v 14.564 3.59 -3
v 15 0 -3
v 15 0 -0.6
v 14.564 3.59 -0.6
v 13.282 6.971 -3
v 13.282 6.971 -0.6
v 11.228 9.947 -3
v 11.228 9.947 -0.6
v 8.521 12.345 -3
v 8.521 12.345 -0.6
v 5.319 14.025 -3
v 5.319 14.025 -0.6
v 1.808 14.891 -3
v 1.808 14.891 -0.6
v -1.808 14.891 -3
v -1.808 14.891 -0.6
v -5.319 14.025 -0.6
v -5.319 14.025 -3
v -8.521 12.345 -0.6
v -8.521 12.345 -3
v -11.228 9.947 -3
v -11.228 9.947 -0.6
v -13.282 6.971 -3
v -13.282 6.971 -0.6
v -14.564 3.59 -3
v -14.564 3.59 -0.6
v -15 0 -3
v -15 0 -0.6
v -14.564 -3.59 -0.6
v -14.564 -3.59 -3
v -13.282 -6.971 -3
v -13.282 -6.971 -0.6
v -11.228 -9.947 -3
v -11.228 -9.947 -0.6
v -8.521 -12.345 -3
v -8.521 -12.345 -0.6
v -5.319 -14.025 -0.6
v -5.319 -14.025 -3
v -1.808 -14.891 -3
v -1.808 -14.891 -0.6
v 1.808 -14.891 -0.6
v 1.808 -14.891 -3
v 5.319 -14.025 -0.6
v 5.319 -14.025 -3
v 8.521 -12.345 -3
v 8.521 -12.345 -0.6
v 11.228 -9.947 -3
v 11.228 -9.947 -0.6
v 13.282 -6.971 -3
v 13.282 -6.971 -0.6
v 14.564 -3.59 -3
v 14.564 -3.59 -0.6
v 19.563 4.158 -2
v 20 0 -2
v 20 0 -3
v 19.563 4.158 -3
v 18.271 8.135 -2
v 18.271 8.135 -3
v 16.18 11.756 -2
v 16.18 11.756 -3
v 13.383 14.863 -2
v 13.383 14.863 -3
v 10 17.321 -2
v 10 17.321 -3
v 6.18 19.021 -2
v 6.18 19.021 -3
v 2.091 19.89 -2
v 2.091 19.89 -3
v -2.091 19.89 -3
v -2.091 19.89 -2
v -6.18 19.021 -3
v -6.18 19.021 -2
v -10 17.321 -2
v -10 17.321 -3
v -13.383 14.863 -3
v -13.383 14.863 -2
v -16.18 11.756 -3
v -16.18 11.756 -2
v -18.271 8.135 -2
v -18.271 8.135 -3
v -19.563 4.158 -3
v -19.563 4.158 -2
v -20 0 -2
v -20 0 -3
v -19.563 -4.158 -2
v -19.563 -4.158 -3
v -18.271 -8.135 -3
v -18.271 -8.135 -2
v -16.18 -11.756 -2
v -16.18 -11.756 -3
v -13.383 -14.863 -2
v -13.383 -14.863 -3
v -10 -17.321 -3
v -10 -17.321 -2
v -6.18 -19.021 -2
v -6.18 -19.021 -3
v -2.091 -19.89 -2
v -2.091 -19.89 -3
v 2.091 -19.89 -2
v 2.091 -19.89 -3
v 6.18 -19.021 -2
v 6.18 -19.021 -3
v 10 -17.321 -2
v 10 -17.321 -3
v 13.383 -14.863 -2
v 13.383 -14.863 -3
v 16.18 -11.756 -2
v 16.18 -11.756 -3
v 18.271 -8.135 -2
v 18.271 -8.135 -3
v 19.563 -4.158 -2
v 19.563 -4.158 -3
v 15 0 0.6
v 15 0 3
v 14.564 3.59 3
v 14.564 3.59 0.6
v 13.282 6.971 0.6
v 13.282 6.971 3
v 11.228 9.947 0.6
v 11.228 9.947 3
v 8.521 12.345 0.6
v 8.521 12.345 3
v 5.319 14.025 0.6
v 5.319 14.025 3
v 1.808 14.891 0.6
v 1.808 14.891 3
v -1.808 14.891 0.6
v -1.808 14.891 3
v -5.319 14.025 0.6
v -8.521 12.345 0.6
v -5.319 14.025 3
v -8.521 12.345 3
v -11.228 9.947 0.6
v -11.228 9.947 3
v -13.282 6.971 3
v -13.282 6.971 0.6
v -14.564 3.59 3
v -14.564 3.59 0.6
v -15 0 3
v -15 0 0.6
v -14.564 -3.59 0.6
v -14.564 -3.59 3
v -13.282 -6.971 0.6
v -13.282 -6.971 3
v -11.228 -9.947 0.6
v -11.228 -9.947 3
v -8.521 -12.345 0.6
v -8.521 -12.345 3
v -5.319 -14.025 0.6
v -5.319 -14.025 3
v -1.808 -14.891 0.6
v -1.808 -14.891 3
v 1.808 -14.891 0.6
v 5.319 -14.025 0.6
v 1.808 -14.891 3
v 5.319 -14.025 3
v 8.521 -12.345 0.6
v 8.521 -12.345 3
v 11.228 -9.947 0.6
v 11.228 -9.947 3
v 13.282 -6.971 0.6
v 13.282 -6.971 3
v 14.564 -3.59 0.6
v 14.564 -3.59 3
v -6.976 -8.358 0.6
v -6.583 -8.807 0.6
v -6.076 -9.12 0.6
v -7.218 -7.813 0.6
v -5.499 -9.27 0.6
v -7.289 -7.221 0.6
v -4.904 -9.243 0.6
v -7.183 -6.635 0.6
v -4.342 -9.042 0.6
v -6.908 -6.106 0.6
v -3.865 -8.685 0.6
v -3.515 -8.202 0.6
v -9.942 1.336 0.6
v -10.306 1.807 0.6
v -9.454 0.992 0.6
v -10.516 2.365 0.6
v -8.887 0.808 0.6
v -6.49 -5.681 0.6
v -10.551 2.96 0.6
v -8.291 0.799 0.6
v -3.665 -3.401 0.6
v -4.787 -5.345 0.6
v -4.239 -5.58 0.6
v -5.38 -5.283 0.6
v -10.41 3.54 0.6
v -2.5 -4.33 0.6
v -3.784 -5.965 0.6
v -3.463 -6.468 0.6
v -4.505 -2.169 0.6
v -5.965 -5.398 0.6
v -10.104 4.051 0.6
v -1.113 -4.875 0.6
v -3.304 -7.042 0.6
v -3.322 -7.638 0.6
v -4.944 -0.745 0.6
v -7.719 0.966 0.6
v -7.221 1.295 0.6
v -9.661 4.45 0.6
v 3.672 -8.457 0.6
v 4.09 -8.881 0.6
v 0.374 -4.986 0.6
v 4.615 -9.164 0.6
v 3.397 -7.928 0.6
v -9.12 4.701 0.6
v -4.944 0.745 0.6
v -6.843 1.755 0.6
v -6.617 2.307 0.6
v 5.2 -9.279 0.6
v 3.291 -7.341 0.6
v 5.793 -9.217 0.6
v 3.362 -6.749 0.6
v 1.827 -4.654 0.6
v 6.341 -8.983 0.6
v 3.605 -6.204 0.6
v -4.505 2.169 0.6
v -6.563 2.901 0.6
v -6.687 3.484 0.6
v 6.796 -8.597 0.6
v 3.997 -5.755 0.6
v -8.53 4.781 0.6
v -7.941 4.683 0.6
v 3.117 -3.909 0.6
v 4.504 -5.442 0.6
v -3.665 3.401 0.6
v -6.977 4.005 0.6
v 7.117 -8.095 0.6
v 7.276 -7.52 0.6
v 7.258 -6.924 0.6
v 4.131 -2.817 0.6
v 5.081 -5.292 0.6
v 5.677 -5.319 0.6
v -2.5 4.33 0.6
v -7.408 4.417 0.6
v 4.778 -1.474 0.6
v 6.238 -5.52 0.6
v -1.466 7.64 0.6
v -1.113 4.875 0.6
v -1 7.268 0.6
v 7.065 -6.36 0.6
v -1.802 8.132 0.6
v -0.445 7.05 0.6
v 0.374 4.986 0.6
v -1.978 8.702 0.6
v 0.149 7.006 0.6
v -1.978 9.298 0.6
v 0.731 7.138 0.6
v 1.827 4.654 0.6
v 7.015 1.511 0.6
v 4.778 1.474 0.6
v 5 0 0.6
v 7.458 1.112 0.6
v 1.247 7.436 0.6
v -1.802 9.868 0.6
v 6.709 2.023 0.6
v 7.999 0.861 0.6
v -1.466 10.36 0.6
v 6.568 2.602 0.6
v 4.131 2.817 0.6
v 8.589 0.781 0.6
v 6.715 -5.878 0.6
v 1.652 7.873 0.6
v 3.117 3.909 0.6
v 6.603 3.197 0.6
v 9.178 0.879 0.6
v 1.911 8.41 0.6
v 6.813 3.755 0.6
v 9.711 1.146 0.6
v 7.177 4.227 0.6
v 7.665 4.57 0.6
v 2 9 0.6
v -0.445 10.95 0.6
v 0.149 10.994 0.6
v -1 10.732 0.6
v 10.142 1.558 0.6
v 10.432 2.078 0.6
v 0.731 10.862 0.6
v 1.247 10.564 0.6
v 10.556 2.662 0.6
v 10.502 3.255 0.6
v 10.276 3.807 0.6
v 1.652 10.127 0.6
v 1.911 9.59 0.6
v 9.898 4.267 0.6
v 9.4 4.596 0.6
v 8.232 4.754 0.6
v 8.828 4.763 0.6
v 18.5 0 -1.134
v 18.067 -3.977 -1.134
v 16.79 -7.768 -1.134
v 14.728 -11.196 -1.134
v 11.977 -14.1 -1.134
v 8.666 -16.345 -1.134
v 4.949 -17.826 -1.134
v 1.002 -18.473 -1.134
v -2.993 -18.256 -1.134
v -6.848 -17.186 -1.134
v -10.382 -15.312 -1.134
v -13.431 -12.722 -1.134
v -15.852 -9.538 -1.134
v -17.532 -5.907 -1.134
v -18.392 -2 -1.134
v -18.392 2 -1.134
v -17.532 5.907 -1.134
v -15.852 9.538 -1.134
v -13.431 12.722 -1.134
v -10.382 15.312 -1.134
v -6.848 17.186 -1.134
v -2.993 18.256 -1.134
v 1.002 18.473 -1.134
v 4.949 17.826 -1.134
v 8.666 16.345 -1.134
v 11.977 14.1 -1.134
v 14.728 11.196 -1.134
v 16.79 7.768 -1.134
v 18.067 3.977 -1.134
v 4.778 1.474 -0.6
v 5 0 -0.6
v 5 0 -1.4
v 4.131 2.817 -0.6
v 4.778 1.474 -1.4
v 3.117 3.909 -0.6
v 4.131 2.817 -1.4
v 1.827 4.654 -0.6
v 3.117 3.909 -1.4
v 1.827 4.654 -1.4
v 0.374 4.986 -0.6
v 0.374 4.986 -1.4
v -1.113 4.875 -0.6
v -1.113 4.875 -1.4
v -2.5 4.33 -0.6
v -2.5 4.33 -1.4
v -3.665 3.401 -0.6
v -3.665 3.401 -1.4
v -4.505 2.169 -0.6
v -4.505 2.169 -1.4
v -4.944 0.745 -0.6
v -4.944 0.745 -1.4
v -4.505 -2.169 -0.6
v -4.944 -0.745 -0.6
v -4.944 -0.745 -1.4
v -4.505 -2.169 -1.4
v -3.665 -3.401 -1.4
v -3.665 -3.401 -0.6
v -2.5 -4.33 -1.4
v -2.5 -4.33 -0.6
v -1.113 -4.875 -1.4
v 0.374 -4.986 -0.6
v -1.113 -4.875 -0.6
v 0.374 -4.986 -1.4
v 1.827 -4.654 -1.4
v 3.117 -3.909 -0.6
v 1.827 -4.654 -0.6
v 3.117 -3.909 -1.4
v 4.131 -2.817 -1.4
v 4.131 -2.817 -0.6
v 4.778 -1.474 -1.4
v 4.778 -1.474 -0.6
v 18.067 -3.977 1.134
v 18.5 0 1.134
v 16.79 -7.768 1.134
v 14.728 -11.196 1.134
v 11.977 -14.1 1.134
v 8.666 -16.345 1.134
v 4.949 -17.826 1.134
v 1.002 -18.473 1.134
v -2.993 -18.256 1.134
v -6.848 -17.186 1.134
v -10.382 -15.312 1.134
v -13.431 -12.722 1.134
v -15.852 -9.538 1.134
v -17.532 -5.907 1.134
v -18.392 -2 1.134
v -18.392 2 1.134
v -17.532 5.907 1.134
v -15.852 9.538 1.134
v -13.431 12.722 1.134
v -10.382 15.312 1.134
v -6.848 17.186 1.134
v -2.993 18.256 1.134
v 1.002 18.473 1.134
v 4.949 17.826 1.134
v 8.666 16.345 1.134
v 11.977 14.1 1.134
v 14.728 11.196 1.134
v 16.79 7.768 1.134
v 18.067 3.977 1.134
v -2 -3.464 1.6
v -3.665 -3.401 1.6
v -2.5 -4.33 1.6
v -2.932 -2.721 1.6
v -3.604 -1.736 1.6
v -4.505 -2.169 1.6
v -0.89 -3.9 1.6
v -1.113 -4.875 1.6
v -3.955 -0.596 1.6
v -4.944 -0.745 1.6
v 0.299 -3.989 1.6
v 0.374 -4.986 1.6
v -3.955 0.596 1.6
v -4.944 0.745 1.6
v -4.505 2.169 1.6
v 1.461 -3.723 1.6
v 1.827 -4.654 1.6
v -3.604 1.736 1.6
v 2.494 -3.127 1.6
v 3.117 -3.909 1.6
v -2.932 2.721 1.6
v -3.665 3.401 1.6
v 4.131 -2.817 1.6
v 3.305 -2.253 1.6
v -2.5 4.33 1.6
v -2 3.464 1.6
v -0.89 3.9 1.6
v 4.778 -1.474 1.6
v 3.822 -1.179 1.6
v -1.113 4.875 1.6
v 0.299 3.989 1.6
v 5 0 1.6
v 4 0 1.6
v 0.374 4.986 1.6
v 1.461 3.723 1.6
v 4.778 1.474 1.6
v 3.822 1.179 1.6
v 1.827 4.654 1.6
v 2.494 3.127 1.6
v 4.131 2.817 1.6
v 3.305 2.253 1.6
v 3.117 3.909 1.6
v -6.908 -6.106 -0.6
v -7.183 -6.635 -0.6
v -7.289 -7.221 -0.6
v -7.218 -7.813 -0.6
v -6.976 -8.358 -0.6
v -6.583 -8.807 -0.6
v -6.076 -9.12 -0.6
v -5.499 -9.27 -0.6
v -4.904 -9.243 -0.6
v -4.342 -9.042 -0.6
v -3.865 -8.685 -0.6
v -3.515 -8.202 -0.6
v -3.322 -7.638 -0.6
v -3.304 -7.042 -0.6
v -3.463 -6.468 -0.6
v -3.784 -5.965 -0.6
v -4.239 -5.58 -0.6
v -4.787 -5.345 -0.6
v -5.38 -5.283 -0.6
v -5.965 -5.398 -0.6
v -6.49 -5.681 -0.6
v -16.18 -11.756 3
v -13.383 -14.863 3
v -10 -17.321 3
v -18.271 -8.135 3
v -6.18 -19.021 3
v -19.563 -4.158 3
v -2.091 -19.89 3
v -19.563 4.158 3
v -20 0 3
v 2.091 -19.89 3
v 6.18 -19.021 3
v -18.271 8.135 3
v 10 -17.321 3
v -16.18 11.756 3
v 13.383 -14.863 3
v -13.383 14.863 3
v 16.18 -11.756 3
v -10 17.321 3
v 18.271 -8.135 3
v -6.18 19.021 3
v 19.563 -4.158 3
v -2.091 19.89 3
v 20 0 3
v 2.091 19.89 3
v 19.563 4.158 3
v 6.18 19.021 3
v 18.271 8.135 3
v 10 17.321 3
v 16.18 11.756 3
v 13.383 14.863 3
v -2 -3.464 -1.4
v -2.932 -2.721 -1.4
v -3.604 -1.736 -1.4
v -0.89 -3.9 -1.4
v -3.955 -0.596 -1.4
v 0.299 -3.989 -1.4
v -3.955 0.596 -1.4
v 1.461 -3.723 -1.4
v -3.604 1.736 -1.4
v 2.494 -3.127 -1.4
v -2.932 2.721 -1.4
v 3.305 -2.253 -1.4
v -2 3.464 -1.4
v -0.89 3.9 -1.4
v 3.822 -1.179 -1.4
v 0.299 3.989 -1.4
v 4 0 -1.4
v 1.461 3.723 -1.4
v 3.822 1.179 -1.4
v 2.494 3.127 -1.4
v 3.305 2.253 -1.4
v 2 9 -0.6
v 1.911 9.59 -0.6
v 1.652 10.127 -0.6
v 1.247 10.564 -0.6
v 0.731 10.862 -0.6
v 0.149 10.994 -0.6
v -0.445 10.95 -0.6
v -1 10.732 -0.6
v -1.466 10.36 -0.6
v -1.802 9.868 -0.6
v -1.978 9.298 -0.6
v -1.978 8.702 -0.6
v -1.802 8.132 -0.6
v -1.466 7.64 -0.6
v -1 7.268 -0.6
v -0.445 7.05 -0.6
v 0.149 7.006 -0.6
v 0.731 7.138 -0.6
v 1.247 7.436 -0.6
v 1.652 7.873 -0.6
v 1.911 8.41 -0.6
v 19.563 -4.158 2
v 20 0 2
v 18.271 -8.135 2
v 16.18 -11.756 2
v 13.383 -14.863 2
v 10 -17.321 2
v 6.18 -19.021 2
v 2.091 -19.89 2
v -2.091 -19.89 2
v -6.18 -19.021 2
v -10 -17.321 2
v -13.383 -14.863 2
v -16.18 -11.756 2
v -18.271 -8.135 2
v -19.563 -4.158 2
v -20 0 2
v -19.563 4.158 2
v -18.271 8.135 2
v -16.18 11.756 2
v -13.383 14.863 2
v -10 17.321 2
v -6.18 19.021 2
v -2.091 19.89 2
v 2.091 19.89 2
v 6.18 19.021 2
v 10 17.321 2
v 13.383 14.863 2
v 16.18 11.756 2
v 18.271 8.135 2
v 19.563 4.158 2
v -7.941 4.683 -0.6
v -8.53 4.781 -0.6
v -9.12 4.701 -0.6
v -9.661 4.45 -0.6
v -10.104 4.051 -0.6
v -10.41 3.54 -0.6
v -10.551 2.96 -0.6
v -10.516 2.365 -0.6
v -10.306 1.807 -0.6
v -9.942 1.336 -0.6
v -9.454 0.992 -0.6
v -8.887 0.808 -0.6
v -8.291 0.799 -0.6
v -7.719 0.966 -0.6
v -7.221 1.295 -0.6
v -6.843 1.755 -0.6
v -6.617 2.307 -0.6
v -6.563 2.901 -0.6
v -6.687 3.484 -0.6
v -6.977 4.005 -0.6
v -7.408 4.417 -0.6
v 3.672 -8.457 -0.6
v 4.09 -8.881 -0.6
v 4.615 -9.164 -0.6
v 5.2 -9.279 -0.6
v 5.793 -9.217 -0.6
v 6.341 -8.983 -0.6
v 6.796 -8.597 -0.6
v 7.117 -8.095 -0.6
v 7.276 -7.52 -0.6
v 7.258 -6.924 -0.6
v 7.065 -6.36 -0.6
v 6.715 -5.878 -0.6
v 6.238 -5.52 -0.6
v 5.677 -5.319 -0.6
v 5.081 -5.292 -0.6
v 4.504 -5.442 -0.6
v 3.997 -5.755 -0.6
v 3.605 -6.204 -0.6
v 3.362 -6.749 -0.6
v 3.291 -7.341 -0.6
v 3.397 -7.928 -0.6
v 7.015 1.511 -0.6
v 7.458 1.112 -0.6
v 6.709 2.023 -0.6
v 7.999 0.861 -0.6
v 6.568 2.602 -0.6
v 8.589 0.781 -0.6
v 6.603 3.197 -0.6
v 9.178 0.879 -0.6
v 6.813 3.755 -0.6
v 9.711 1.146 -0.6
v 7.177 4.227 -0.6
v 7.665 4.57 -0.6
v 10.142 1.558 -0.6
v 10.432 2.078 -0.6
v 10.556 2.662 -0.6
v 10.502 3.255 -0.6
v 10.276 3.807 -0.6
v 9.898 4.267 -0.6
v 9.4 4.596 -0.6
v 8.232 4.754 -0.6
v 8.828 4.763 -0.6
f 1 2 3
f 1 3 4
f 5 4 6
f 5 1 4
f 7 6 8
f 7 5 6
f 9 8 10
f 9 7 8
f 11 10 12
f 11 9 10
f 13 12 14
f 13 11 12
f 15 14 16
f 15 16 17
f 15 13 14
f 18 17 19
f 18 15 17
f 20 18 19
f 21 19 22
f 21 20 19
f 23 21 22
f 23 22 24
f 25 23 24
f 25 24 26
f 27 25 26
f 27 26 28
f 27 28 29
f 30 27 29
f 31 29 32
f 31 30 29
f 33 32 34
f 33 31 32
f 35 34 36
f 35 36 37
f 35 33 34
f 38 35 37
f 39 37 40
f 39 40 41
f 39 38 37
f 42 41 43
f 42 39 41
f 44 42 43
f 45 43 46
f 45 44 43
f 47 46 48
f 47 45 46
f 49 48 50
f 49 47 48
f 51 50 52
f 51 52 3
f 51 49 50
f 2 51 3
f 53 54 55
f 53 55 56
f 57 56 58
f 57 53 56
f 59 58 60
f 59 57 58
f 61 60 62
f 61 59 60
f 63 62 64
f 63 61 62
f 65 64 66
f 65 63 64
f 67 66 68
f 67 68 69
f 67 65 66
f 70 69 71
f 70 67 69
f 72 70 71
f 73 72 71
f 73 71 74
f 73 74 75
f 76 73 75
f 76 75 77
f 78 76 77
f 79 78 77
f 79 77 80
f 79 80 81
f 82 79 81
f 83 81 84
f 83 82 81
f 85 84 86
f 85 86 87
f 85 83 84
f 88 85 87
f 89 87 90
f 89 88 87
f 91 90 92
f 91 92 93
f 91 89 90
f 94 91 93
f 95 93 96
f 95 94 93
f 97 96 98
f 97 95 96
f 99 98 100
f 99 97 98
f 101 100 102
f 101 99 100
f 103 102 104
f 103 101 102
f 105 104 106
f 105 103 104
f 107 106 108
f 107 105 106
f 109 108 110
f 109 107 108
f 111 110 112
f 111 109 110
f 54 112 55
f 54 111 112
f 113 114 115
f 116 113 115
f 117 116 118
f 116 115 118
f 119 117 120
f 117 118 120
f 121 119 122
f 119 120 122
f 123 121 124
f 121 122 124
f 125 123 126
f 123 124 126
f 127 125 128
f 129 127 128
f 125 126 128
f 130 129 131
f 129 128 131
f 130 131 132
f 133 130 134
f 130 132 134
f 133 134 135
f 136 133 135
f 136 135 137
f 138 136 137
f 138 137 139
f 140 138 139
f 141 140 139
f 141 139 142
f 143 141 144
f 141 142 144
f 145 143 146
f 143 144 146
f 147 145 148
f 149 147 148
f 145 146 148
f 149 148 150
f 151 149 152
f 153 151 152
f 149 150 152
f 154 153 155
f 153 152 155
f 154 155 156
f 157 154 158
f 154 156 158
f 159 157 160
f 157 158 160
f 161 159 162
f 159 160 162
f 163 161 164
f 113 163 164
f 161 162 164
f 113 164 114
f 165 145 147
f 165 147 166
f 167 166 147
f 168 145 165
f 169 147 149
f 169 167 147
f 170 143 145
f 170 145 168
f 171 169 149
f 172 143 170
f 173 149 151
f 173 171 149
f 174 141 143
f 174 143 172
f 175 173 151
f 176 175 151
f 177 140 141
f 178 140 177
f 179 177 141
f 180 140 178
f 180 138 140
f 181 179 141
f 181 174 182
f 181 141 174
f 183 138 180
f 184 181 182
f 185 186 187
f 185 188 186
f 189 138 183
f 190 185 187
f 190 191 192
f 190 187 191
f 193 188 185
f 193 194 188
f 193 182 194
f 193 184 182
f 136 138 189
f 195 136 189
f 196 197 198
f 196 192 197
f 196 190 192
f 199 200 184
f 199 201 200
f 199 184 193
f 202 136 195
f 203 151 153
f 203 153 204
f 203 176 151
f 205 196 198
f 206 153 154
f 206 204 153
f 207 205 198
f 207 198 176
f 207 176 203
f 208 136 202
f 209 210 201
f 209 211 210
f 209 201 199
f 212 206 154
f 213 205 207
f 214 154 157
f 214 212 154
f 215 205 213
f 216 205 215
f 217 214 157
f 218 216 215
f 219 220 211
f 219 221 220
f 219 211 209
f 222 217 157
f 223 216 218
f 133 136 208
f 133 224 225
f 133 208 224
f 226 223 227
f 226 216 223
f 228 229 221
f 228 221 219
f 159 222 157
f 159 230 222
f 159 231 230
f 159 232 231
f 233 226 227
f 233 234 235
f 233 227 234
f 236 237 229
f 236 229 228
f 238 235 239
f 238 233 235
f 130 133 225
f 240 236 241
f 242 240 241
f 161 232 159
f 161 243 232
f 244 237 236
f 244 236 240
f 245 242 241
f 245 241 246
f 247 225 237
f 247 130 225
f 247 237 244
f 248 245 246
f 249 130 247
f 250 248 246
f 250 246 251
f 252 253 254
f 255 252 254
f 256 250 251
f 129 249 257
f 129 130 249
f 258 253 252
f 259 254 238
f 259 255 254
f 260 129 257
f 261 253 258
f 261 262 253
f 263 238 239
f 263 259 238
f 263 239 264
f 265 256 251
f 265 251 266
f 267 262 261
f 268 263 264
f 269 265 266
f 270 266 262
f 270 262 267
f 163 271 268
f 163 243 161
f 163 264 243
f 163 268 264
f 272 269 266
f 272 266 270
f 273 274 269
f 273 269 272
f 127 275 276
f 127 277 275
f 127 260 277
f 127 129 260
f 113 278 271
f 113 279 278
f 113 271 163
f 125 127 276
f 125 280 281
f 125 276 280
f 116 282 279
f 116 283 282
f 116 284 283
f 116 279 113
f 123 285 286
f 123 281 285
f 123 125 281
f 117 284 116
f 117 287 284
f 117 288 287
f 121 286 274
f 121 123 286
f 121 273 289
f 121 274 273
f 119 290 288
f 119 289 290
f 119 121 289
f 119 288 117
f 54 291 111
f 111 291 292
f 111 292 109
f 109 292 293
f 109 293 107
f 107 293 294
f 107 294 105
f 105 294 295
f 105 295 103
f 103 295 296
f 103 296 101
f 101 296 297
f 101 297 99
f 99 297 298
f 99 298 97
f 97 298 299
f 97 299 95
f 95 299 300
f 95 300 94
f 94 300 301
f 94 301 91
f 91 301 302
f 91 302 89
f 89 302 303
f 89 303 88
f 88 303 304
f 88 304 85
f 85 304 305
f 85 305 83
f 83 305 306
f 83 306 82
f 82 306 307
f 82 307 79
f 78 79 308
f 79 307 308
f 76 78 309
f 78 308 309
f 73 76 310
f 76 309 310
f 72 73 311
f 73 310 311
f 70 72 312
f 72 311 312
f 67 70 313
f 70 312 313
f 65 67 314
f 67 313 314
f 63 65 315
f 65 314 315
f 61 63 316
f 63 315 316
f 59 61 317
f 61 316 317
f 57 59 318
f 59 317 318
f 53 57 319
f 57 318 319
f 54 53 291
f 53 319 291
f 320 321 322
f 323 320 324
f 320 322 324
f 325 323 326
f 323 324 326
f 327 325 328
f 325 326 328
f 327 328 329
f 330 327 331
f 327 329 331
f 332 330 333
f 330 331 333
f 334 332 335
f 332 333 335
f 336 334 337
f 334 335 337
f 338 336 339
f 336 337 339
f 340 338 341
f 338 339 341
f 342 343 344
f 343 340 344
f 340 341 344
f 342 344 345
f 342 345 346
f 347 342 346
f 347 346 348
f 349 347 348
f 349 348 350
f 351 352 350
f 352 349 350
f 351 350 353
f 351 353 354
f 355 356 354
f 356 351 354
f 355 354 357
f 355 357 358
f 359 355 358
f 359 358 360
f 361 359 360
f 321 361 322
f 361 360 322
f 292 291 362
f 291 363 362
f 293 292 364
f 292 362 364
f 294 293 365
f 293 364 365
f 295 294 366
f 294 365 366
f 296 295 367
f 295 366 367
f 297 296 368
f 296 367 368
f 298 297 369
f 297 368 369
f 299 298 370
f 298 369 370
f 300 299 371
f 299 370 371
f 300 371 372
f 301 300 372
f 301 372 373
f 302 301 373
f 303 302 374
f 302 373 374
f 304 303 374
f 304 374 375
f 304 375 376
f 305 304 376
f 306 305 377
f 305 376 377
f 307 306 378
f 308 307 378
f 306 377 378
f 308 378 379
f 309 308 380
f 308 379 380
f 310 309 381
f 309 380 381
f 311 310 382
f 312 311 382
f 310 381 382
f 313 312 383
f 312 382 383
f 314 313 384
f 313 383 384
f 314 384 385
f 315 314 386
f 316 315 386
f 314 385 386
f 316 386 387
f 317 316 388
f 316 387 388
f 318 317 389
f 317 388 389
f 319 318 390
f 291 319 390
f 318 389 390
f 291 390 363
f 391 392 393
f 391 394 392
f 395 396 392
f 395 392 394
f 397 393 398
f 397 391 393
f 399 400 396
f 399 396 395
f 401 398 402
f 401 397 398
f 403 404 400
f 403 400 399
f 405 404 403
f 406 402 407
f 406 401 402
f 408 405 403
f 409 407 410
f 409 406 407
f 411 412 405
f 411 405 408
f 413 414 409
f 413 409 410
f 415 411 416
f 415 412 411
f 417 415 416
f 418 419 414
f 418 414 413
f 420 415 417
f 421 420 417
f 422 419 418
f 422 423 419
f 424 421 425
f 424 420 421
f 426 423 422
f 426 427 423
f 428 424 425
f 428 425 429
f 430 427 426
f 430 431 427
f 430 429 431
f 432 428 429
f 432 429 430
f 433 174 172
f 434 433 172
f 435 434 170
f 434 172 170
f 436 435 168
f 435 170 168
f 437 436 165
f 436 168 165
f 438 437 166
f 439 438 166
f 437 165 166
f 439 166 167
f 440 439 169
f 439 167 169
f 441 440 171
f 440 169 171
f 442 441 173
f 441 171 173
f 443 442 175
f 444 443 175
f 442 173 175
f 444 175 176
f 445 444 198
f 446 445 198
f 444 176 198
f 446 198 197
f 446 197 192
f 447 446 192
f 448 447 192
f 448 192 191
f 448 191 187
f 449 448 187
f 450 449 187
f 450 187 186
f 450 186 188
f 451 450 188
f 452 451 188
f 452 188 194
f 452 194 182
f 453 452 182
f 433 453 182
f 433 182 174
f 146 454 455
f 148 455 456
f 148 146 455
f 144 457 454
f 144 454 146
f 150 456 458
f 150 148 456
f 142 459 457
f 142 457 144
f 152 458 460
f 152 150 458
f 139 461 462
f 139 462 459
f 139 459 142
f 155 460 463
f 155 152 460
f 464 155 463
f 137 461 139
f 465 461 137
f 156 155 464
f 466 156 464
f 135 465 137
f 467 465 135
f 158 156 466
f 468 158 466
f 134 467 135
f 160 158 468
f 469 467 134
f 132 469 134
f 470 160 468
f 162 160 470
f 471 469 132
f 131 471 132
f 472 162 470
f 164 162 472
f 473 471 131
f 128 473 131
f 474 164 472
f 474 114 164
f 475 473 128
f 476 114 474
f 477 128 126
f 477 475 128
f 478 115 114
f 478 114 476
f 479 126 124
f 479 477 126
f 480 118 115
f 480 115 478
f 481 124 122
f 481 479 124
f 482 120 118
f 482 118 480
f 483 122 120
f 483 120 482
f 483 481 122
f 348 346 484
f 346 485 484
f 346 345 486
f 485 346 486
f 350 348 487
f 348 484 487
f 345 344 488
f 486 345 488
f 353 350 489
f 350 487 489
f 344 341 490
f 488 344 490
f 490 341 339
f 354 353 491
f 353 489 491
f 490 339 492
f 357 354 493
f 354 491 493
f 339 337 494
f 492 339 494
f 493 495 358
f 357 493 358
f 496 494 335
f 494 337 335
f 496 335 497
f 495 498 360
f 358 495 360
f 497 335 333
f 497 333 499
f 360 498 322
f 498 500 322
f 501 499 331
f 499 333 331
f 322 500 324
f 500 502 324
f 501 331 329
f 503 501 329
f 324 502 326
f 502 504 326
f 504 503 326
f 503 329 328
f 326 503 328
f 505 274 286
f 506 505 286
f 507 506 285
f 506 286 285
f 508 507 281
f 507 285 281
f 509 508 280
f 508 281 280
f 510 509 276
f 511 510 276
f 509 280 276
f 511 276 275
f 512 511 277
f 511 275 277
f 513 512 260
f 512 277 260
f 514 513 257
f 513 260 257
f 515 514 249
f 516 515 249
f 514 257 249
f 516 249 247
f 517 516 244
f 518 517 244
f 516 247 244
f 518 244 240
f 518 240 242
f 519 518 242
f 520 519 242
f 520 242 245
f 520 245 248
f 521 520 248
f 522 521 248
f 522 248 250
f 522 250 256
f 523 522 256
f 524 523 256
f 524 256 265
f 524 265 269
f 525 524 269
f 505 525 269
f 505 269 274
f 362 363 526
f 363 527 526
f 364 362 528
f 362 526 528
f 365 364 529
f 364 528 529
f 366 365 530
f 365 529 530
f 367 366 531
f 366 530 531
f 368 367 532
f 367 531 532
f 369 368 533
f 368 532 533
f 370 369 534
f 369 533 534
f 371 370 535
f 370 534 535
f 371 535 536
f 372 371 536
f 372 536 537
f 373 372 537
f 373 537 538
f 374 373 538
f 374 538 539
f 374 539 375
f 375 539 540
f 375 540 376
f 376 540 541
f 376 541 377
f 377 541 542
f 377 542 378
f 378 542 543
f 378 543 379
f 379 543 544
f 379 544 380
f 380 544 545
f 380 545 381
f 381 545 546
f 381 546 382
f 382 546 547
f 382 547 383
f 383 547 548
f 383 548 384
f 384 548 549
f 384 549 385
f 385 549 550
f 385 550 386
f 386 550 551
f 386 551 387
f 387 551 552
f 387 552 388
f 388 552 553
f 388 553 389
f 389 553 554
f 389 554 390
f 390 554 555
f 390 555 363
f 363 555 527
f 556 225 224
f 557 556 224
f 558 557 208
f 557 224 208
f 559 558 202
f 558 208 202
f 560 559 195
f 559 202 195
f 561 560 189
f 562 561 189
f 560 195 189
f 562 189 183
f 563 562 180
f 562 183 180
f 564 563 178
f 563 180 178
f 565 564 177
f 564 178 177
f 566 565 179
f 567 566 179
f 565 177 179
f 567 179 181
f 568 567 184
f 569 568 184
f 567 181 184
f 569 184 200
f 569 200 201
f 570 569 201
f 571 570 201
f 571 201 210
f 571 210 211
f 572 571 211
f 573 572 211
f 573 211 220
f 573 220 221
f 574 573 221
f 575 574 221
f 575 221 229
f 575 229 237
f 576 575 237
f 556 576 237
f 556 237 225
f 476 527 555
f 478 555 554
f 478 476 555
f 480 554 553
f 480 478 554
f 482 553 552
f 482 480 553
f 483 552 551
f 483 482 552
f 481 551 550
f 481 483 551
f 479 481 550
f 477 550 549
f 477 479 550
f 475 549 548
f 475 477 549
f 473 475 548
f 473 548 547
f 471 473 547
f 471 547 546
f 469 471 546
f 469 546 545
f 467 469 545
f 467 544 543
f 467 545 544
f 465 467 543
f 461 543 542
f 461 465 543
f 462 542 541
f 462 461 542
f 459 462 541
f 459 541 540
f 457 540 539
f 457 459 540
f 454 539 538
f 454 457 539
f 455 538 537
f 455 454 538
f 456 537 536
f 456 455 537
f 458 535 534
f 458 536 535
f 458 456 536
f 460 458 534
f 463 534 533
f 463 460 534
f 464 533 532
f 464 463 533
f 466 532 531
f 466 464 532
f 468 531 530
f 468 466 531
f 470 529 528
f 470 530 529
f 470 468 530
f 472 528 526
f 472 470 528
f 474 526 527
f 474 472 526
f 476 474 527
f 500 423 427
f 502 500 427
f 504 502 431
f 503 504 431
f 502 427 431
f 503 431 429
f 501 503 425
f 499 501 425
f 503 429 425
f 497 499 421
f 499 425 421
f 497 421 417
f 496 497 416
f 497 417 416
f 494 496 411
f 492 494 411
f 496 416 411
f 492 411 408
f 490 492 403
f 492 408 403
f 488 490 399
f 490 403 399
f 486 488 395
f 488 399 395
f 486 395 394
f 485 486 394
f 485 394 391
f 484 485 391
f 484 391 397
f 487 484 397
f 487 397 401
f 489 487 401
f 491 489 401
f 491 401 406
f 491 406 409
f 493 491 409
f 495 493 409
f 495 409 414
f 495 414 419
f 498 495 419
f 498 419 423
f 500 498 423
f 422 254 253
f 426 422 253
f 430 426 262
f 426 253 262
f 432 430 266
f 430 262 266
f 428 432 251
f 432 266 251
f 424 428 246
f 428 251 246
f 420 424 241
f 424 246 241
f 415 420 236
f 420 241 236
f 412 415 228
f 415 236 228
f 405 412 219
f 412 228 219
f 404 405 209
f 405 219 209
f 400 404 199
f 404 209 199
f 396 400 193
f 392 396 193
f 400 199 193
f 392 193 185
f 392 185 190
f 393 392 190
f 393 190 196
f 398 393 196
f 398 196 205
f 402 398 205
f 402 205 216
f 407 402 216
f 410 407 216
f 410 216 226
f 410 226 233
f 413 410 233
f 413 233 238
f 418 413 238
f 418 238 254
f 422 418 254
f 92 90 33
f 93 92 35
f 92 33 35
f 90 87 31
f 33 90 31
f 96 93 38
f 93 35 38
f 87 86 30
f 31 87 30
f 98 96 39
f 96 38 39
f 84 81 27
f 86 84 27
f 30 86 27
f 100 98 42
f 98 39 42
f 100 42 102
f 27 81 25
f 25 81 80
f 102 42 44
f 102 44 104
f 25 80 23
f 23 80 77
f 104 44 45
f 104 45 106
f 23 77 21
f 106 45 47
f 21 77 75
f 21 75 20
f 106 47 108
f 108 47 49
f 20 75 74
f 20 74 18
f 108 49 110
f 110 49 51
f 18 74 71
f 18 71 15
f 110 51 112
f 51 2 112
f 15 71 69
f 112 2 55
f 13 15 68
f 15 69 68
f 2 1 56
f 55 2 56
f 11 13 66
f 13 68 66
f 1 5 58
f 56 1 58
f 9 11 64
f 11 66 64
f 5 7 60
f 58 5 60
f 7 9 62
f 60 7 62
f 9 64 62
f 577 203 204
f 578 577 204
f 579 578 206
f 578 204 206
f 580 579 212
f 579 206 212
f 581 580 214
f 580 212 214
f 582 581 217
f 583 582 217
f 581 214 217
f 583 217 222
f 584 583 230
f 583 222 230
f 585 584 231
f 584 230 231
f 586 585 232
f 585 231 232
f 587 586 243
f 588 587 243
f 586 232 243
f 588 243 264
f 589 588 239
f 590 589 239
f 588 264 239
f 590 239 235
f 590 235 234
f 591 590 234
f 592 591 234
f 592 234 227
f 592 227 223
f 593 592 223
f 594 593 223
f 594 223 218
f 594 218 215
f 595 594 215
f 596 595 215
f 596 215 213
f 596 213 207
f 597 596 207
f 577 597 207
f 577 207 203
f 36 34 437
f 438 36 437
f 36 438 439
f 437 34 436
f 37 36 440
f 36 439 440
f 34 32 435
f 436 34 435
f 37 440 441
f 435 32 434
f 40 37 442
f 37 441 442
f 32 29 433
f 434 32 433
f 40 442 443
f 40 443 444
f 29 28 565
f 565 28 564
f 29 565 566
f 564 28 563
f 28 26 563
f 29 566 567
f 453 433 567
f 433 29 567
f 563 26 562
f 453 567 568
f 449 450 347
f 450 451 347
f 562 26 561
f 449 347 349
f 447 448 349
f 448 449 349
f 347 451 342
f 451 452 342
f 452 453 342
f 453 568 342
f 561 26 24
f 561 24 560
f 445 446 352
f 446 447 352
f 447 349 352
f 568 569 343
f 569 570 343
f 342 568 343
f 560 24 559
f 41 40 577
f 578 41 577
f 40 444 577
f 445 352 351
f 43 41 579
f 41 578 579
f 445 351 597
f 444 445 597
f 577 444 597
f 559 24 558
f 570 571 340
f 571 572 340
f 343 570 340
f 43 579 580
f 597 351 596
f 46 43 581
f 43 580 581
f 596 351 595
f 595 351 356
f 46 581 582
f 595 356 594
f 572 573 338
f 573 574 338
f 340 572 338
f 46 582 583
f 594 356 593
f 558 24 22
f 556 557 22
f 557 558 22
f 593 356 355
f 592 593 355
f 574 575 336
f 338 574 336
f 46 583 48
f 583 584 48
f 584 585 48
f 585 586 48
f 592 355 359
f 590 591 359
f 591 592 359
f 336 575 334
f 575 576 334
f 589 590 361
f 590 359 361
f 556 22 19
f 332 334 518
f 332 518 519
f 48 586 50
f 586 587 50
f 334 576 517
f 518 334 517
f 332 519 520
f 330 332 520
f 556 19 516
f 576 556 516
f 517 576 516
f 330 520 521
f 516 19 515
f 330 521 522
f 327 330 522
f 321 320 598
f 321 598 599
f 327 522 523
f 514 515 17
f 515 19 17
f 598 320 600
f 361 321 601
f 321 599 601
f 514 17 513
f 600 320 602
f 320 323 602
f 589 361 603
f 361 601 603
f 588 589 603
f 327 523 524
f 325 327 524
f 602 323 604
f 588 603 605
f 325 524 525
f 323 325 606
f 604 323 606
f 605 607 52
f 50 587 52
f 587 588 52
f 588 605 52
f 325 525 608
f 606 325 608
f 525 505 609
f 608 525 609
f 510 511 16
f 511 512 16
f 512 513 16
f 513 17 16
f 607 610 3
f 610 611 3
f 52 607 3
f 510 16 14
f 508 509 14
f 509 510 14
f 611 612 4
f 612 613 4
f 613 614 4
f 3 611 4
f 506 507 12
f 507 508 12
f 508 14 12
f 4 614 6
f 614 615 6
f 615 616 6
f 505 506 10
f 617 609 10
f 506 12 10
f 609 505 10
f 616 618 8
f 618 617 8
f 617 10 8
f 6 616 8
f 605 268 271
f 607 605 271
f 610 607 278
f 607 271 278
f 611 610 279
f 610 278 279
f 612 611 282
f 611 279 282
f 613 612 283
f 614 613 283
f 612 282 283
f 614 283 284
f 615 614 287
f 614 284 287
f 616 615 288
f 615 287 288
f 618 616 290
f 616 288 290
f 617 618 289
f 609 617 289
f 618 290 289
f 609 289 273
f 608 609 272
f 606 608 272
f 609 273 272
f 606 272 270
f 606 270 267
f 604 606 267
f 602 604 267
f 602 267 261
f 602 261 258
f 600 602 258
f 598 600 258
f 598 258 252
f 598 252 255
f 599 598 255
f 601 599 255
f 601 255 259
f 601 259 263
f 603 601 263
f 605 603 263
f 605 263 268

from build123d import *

# Parameters (mm, degrees)
SKETCH1_R                = 20
SKETCH1_R_2              = 4
BOSS_EXTRUDE1_DEPTH      = 3
SKETCH3_R                = 15
CUT_EXTRUDE1_DEPTH       = 2.4
SKETCH4_R                = 2
CUT_EXTRUDE2_DEPTH       = 29.51245342
CIRPATTERN1_COUNT        = 5
BOSS_EXTRUDE3_DEPTH      = 1
BOSS_EXTRUDE3_DEPTH_BACK = 2
SKETCH14_R               = 5
SKETCH16_R               = 4
CUT_EXTRUDE3_DEPTH       = 29.655889447


with BuildPart() as part:
    # Sketch1 → Boss-Extrude1 (new, symmetric)
    with BuildSketch(Plane.XY):
        Circle(SKETCH1_R)
        Circle(SKETCH1_R_2, mode=Mode.SUBTRACT)
    extrude(amount=BOSS_EXTRUDE1_DEPTH, both=True)

    # Sketch3 → Cut-Extrude1 (cut)
    with BuildSketch(Plane.XY.offset(3)):
        Circle(SKETCH3_R)
    cut_extrude1 = extrude(amount=-CUT_EXTRUDE1_DEPTH, mode=Mode.SUBTRACT)

    # Mirror1: Cut-Extrude1 across plane
    add(cut_extrude1.mirror(Plane.XY), mode=Mode.SUBTRACT)

    # Sketch4 → Cut-Extrude2 (cut, through all)
    with BuildSketch(Plane.XY.offset(0.6)):
        with Locations((0, 9)):
            Circle(SKETCH4_R)
    cut_extrude2 = extrude(amount=-CUT_EXTRUDE2_DEPTH, mode=Mode.SUBTRACT)

    # CirPattern1: Cut-Extrude2 ×5 about axis
    cirpattern1_axis = Axis((0, 0, 0), (0, 0, 1))
    for i in range(1, CIRPATTERN1_COUNT):
        add(cut_extrude2.rotate(cirpattern1_axis, i * 360 / CIRPATTERN1_COUNT), mode=Mode.SUBTRACT)

    # Sketch5 → Cut-Revolve1 (revolve, cut)
    with BuildSketch(Plane(origin=(0, 0, 0), x_dir=(1, 0, 0), z_dir=(0, 1, 0))):
        Polygon((20, 2), (18.5, 1.133974596), (18.5, -1.133974596), (20, -2), align=None)
    revolve(axis=Axis((0, 0, 0), (0, 0, -1)), mode=Mode.SUBTRACT)

    # Sketch14 → Boss-Extrude3 (add, two sides: drawn at the far end of the back side and taken through both)
    with BuildSketch(Plane.XY.offset(0.6).offset(-BOSS_EXTRUDE3_DEPTH_BACK)):
        Circle(SKETCH14_R)
    extrude(amount=BOSS_EXTRUDE3_DEPTH + BOSS_EXTRUDE3_DEPTH_BACK)

    # Sketch16 → Cut-Extrude3 (cut, through all)
    with BuildSketch(Plane.XY.offset(1.6)):
        Circle(SKETCH16_R)
    extrude(amount=-CUT_EXTRUDE3_DEPTH, mode=Mode.SUBTRACT)


solid = part.part
